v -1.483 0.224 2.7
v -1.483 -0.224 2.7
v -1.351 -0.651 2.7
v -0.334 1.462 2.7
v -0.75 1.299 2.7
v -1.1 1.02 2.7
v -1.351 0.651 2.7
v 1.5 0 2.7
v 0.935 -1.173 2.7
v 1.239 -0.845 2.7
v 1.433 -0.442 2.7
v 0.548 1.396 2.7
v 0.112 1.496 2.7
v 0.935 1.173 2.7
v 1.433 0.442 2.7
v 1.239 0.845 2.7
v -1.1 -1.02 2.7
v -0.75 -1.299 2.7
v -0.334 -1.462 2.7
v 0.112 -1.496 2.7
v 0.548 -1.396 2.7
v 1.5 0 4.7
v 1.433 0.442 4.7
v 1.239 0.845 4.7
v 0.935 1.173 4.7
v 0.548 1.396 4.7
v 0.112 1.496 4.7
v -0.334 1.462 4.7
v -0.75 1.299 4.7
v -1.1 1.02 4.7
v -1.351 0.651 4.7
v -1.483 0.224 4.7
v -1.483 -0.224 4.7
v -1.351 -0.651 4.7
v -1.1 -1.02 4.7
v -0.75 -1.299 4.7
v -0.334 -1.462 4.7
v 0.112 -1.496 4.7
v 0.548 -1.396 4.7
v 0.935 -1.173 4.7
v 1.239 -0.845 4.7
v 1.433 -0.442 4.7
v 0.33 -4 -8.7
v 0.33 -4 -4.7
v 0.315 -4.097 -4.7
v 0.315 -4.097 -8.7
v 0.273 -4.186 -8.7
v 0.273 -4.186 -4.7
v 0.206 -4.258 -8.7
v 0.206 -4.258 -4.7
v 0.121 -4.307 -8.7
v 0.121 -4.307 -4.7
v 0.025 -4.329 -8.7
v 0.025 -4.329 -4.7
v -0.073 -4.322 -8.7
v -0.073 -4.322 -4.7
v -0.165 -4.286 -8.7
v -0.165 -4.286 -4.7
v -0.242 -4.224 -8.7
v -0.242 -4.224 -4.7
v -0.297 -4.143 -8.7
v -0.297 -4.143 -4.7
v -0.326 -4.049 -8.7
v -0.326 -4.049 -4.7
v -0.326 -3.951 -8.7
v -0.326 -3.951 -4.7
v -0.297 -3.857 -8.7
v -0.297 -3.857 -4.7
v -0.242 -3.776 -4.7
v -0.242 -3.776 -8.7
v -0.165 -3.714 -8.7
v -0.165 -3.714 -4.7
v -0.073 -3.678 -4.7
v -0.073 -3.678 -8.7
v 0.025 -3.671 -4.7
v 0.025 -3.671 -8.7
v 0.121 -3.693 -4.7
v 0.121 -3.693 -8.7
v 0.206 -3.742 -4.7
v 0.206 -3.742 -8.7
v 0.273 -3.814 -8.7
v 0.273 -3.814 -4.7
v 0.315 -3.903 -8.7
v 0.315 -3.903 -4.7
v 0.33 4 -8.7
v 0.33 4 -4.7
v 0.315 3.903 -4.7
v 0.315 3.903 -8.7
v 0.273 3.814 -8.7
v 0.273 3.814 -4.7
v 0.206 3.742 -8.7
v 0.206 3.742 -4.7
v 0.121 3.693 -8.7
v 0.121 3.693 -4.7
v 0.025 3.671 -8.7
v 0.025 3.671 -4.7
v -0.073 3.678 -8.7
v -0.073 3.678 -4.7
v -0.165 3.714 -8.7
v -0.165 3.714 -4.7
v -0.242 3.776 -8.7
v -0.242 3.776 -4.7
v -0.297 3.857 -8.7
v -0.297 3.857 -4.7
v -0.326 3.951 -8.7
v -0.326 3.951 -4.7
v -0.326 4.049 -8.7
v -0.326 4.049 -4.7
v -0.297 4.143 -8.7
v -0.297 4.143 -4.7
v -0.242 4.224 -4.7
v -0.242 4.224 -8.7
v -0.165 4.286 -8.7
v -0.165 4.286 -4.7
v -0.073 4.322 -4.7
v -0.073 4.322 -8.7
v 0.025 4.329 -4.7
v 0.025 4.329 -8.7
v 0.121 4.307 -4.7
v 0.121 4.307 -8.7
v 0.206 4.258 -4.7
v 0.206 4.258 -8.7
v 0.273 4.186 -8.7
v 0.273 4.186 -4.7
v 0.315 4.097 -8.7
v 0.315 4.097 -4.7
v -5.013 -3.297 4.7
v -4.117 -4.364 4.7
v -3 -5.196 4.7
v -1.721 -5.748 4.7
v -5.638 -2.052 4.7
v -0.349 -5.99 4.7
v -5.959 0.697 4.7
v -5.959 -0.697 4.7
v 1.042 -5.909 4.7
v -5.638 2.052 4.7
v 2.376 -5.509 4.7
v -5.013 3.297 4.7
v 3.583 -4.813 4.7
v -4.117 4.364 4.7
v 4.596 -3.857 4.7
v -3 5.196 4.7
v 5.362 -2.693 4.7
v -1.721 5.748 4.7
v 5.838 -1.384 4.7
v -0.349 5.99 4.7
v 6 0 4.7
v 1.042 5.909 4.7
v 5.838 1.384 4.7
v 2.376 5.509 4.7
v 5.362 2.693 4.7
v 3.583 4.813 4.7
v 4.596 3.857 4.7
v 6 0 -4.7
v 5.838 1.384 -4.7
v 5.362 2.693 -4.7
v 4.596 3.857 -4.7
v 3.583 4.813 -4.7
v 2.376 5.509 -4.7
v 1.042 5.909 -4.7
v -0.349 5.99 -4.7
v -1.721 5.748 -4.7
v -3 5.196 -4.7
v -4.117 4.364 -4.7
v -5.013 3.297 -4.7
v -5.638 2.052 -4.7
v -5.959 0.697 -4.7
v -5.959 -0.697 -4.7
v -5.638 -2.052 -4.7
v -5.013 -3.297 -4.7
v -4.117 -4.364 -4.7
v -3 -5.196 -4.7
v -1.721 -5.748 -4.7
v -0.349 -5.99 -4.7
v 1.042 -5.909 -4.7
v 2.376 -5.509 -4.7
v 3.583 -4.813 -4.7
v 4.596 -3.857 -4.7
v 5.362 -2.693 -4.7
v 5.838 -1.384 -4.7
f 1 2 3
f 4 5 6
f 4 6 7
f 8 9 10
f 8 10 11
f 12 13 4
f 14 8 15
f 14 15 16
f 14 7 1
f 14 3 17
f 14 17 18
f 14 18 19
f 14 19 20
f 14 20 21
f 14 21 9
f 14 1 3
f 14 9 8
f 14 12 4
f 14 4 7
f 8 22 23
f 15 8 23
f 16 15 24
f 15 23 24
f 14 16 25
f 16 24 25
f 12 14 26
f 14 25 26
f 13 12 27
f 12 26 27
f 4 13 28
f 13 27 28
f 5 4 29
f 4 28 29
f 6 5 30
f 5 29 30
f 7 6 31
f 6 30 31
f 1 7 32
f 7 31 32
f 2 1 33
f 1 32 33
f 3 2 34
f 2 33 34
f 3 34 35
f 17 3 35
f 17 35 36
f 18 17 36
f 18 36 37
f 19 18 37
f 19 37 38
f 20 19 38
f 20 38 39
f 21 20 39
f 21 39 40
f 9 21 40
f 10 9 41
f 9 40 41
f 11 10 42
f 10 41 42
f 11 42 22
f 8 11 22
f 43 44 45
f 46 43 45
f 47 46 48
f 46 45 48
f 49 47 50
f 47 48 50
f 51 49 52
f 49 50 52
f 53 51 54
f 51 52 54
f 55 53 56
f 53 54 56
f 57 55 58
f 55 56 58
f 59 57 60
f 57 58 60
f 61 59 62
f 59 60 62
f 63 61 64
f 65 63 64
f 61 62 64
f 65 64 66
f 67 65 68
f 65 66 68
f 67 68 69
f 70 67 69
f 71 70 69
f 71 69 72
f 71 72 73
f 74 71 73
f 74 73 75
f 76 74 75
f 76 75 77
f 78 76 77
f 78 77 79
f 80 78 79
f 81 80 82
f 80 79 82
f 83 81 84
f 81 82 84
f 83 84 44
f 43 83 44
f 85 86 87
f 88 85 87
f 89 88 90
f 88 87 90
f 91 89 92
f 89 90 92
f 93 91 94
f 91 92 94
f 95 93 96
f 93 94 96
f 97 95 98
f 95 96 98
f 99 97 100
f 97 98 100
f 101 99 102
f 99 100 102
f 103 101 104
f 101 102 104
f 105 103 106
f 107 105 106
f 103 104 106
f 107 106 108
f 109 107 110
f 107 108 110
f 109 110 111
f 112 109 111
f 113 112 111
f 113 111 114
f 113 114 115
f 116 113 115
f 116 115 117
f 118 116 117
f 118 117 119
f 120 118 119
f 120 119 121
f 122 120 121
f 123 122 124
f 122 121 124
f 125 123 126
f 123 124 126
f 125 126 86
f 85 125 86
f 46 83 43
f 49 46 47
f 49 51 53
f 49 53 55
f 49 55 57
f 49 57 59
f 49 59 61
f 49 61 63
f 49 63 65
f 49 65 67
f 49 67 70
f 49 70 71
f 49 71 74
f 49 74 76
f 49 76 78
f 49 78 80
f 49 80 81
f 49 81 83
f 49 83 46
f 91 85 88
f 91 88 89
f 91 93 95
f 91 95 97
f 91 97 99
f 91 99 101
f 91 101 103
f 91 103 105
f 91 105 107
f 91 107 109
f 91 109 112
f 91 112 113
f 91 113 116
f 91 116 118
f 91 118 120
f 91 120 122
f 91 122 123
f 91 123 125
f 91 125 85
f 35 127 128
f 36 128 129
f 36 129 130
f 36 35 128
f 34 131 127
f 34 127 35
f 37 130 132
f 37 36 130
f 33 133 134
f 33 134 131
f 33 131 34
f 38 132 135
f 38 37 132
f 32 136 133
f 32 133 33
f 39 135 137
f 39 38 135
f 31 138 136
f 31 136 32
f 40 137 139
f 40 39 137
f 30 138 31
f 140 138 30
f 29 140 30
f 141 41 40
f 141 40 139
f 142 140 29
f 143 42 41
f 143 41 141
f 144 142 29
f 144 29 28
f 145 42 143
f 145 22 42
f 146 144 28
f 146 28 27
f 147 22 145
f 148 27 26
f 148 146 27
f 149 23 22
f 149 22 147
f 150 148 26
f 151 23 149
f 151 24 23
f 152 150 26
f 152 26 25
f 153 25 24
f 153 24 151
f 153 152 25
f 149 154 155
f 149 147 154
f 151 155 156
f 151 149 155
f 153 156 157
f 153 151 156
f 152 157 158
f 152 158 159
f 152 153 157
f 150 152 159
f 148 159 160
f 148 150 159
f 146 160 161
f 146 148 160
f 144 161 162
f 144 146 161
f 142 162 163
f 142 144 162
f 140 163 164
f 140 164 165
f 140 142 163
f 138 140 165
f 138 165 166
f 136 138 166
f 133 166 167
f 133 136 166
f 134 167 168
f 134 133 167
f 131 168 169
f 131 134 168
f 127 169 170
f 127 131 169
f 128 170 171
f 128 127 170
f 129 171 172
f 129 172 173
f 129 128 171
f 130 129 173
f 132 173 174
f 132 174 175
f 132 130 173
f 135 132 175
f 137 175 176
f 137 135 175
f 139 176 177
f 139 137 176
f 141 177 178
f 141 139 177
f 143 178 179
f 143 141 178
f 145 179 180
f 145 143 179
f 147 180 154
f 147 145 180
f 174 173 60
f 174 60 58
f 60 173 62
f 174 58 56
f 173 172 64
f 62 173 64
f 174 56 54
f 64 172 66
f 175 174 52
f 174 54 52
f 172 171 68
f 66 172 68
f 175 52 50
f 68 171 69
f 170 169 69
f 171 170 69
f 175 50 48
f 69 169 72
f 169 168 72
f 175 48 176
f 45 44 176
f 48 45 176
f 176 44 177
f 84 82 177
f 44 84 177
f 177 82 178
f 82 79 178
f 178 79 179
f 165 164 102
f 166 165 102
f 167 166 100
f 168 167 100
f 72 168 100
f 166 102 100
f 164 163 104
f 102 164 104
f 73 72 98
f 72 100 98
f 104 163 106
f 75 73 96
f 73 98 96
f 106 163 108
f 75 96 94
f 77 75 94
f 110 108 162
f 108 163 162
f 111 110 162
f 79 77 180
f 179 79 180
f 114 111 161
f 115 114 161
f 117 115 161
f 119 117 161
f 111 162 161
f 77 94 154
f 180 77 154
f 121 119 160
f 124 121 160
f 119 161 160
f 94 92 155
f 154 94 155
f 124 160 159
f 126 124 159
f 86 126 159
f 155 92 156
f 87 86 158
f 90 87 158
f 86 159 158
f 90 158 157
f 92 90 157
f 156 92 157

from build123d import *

# Parameters (mm, degrees)
F0_R     = 6
F1_DEPTH = 4.7
F2_R     = 1.5
F3_DEPTH = 2
F4_R     = 0.33
F5_DEPTH = 4


with BuildPart() as f1:
    # F0 (on Top) → F1 (new body, symmetric)
    with BuildSketch(Plane.XY):
        Circle(F0_R)
    extrude(amount=F1_DEPTH, both=True)

    # F2 (on face) → F3 (cut)
    with BuildSketch(Plane.XY.offset(4.7)):
        Circle(F2_R)
    extrude(amount=-F3_DEPTH, mode=Mode.SUBTRACT)

    # F4 (on face) → F5 (join)
    with BuildSketch(Plane(origin=(0, 0, -4.7), x_dir=(1, 0, 0), z_dir=(0, 0, -1))):
        with Locations((0, 4)):
            Circle(F4_R)
        with Locations((0, -4)):
            Circle(F4_R)
    extrude(amount=F5_DEPTH)


solid = f1.part
